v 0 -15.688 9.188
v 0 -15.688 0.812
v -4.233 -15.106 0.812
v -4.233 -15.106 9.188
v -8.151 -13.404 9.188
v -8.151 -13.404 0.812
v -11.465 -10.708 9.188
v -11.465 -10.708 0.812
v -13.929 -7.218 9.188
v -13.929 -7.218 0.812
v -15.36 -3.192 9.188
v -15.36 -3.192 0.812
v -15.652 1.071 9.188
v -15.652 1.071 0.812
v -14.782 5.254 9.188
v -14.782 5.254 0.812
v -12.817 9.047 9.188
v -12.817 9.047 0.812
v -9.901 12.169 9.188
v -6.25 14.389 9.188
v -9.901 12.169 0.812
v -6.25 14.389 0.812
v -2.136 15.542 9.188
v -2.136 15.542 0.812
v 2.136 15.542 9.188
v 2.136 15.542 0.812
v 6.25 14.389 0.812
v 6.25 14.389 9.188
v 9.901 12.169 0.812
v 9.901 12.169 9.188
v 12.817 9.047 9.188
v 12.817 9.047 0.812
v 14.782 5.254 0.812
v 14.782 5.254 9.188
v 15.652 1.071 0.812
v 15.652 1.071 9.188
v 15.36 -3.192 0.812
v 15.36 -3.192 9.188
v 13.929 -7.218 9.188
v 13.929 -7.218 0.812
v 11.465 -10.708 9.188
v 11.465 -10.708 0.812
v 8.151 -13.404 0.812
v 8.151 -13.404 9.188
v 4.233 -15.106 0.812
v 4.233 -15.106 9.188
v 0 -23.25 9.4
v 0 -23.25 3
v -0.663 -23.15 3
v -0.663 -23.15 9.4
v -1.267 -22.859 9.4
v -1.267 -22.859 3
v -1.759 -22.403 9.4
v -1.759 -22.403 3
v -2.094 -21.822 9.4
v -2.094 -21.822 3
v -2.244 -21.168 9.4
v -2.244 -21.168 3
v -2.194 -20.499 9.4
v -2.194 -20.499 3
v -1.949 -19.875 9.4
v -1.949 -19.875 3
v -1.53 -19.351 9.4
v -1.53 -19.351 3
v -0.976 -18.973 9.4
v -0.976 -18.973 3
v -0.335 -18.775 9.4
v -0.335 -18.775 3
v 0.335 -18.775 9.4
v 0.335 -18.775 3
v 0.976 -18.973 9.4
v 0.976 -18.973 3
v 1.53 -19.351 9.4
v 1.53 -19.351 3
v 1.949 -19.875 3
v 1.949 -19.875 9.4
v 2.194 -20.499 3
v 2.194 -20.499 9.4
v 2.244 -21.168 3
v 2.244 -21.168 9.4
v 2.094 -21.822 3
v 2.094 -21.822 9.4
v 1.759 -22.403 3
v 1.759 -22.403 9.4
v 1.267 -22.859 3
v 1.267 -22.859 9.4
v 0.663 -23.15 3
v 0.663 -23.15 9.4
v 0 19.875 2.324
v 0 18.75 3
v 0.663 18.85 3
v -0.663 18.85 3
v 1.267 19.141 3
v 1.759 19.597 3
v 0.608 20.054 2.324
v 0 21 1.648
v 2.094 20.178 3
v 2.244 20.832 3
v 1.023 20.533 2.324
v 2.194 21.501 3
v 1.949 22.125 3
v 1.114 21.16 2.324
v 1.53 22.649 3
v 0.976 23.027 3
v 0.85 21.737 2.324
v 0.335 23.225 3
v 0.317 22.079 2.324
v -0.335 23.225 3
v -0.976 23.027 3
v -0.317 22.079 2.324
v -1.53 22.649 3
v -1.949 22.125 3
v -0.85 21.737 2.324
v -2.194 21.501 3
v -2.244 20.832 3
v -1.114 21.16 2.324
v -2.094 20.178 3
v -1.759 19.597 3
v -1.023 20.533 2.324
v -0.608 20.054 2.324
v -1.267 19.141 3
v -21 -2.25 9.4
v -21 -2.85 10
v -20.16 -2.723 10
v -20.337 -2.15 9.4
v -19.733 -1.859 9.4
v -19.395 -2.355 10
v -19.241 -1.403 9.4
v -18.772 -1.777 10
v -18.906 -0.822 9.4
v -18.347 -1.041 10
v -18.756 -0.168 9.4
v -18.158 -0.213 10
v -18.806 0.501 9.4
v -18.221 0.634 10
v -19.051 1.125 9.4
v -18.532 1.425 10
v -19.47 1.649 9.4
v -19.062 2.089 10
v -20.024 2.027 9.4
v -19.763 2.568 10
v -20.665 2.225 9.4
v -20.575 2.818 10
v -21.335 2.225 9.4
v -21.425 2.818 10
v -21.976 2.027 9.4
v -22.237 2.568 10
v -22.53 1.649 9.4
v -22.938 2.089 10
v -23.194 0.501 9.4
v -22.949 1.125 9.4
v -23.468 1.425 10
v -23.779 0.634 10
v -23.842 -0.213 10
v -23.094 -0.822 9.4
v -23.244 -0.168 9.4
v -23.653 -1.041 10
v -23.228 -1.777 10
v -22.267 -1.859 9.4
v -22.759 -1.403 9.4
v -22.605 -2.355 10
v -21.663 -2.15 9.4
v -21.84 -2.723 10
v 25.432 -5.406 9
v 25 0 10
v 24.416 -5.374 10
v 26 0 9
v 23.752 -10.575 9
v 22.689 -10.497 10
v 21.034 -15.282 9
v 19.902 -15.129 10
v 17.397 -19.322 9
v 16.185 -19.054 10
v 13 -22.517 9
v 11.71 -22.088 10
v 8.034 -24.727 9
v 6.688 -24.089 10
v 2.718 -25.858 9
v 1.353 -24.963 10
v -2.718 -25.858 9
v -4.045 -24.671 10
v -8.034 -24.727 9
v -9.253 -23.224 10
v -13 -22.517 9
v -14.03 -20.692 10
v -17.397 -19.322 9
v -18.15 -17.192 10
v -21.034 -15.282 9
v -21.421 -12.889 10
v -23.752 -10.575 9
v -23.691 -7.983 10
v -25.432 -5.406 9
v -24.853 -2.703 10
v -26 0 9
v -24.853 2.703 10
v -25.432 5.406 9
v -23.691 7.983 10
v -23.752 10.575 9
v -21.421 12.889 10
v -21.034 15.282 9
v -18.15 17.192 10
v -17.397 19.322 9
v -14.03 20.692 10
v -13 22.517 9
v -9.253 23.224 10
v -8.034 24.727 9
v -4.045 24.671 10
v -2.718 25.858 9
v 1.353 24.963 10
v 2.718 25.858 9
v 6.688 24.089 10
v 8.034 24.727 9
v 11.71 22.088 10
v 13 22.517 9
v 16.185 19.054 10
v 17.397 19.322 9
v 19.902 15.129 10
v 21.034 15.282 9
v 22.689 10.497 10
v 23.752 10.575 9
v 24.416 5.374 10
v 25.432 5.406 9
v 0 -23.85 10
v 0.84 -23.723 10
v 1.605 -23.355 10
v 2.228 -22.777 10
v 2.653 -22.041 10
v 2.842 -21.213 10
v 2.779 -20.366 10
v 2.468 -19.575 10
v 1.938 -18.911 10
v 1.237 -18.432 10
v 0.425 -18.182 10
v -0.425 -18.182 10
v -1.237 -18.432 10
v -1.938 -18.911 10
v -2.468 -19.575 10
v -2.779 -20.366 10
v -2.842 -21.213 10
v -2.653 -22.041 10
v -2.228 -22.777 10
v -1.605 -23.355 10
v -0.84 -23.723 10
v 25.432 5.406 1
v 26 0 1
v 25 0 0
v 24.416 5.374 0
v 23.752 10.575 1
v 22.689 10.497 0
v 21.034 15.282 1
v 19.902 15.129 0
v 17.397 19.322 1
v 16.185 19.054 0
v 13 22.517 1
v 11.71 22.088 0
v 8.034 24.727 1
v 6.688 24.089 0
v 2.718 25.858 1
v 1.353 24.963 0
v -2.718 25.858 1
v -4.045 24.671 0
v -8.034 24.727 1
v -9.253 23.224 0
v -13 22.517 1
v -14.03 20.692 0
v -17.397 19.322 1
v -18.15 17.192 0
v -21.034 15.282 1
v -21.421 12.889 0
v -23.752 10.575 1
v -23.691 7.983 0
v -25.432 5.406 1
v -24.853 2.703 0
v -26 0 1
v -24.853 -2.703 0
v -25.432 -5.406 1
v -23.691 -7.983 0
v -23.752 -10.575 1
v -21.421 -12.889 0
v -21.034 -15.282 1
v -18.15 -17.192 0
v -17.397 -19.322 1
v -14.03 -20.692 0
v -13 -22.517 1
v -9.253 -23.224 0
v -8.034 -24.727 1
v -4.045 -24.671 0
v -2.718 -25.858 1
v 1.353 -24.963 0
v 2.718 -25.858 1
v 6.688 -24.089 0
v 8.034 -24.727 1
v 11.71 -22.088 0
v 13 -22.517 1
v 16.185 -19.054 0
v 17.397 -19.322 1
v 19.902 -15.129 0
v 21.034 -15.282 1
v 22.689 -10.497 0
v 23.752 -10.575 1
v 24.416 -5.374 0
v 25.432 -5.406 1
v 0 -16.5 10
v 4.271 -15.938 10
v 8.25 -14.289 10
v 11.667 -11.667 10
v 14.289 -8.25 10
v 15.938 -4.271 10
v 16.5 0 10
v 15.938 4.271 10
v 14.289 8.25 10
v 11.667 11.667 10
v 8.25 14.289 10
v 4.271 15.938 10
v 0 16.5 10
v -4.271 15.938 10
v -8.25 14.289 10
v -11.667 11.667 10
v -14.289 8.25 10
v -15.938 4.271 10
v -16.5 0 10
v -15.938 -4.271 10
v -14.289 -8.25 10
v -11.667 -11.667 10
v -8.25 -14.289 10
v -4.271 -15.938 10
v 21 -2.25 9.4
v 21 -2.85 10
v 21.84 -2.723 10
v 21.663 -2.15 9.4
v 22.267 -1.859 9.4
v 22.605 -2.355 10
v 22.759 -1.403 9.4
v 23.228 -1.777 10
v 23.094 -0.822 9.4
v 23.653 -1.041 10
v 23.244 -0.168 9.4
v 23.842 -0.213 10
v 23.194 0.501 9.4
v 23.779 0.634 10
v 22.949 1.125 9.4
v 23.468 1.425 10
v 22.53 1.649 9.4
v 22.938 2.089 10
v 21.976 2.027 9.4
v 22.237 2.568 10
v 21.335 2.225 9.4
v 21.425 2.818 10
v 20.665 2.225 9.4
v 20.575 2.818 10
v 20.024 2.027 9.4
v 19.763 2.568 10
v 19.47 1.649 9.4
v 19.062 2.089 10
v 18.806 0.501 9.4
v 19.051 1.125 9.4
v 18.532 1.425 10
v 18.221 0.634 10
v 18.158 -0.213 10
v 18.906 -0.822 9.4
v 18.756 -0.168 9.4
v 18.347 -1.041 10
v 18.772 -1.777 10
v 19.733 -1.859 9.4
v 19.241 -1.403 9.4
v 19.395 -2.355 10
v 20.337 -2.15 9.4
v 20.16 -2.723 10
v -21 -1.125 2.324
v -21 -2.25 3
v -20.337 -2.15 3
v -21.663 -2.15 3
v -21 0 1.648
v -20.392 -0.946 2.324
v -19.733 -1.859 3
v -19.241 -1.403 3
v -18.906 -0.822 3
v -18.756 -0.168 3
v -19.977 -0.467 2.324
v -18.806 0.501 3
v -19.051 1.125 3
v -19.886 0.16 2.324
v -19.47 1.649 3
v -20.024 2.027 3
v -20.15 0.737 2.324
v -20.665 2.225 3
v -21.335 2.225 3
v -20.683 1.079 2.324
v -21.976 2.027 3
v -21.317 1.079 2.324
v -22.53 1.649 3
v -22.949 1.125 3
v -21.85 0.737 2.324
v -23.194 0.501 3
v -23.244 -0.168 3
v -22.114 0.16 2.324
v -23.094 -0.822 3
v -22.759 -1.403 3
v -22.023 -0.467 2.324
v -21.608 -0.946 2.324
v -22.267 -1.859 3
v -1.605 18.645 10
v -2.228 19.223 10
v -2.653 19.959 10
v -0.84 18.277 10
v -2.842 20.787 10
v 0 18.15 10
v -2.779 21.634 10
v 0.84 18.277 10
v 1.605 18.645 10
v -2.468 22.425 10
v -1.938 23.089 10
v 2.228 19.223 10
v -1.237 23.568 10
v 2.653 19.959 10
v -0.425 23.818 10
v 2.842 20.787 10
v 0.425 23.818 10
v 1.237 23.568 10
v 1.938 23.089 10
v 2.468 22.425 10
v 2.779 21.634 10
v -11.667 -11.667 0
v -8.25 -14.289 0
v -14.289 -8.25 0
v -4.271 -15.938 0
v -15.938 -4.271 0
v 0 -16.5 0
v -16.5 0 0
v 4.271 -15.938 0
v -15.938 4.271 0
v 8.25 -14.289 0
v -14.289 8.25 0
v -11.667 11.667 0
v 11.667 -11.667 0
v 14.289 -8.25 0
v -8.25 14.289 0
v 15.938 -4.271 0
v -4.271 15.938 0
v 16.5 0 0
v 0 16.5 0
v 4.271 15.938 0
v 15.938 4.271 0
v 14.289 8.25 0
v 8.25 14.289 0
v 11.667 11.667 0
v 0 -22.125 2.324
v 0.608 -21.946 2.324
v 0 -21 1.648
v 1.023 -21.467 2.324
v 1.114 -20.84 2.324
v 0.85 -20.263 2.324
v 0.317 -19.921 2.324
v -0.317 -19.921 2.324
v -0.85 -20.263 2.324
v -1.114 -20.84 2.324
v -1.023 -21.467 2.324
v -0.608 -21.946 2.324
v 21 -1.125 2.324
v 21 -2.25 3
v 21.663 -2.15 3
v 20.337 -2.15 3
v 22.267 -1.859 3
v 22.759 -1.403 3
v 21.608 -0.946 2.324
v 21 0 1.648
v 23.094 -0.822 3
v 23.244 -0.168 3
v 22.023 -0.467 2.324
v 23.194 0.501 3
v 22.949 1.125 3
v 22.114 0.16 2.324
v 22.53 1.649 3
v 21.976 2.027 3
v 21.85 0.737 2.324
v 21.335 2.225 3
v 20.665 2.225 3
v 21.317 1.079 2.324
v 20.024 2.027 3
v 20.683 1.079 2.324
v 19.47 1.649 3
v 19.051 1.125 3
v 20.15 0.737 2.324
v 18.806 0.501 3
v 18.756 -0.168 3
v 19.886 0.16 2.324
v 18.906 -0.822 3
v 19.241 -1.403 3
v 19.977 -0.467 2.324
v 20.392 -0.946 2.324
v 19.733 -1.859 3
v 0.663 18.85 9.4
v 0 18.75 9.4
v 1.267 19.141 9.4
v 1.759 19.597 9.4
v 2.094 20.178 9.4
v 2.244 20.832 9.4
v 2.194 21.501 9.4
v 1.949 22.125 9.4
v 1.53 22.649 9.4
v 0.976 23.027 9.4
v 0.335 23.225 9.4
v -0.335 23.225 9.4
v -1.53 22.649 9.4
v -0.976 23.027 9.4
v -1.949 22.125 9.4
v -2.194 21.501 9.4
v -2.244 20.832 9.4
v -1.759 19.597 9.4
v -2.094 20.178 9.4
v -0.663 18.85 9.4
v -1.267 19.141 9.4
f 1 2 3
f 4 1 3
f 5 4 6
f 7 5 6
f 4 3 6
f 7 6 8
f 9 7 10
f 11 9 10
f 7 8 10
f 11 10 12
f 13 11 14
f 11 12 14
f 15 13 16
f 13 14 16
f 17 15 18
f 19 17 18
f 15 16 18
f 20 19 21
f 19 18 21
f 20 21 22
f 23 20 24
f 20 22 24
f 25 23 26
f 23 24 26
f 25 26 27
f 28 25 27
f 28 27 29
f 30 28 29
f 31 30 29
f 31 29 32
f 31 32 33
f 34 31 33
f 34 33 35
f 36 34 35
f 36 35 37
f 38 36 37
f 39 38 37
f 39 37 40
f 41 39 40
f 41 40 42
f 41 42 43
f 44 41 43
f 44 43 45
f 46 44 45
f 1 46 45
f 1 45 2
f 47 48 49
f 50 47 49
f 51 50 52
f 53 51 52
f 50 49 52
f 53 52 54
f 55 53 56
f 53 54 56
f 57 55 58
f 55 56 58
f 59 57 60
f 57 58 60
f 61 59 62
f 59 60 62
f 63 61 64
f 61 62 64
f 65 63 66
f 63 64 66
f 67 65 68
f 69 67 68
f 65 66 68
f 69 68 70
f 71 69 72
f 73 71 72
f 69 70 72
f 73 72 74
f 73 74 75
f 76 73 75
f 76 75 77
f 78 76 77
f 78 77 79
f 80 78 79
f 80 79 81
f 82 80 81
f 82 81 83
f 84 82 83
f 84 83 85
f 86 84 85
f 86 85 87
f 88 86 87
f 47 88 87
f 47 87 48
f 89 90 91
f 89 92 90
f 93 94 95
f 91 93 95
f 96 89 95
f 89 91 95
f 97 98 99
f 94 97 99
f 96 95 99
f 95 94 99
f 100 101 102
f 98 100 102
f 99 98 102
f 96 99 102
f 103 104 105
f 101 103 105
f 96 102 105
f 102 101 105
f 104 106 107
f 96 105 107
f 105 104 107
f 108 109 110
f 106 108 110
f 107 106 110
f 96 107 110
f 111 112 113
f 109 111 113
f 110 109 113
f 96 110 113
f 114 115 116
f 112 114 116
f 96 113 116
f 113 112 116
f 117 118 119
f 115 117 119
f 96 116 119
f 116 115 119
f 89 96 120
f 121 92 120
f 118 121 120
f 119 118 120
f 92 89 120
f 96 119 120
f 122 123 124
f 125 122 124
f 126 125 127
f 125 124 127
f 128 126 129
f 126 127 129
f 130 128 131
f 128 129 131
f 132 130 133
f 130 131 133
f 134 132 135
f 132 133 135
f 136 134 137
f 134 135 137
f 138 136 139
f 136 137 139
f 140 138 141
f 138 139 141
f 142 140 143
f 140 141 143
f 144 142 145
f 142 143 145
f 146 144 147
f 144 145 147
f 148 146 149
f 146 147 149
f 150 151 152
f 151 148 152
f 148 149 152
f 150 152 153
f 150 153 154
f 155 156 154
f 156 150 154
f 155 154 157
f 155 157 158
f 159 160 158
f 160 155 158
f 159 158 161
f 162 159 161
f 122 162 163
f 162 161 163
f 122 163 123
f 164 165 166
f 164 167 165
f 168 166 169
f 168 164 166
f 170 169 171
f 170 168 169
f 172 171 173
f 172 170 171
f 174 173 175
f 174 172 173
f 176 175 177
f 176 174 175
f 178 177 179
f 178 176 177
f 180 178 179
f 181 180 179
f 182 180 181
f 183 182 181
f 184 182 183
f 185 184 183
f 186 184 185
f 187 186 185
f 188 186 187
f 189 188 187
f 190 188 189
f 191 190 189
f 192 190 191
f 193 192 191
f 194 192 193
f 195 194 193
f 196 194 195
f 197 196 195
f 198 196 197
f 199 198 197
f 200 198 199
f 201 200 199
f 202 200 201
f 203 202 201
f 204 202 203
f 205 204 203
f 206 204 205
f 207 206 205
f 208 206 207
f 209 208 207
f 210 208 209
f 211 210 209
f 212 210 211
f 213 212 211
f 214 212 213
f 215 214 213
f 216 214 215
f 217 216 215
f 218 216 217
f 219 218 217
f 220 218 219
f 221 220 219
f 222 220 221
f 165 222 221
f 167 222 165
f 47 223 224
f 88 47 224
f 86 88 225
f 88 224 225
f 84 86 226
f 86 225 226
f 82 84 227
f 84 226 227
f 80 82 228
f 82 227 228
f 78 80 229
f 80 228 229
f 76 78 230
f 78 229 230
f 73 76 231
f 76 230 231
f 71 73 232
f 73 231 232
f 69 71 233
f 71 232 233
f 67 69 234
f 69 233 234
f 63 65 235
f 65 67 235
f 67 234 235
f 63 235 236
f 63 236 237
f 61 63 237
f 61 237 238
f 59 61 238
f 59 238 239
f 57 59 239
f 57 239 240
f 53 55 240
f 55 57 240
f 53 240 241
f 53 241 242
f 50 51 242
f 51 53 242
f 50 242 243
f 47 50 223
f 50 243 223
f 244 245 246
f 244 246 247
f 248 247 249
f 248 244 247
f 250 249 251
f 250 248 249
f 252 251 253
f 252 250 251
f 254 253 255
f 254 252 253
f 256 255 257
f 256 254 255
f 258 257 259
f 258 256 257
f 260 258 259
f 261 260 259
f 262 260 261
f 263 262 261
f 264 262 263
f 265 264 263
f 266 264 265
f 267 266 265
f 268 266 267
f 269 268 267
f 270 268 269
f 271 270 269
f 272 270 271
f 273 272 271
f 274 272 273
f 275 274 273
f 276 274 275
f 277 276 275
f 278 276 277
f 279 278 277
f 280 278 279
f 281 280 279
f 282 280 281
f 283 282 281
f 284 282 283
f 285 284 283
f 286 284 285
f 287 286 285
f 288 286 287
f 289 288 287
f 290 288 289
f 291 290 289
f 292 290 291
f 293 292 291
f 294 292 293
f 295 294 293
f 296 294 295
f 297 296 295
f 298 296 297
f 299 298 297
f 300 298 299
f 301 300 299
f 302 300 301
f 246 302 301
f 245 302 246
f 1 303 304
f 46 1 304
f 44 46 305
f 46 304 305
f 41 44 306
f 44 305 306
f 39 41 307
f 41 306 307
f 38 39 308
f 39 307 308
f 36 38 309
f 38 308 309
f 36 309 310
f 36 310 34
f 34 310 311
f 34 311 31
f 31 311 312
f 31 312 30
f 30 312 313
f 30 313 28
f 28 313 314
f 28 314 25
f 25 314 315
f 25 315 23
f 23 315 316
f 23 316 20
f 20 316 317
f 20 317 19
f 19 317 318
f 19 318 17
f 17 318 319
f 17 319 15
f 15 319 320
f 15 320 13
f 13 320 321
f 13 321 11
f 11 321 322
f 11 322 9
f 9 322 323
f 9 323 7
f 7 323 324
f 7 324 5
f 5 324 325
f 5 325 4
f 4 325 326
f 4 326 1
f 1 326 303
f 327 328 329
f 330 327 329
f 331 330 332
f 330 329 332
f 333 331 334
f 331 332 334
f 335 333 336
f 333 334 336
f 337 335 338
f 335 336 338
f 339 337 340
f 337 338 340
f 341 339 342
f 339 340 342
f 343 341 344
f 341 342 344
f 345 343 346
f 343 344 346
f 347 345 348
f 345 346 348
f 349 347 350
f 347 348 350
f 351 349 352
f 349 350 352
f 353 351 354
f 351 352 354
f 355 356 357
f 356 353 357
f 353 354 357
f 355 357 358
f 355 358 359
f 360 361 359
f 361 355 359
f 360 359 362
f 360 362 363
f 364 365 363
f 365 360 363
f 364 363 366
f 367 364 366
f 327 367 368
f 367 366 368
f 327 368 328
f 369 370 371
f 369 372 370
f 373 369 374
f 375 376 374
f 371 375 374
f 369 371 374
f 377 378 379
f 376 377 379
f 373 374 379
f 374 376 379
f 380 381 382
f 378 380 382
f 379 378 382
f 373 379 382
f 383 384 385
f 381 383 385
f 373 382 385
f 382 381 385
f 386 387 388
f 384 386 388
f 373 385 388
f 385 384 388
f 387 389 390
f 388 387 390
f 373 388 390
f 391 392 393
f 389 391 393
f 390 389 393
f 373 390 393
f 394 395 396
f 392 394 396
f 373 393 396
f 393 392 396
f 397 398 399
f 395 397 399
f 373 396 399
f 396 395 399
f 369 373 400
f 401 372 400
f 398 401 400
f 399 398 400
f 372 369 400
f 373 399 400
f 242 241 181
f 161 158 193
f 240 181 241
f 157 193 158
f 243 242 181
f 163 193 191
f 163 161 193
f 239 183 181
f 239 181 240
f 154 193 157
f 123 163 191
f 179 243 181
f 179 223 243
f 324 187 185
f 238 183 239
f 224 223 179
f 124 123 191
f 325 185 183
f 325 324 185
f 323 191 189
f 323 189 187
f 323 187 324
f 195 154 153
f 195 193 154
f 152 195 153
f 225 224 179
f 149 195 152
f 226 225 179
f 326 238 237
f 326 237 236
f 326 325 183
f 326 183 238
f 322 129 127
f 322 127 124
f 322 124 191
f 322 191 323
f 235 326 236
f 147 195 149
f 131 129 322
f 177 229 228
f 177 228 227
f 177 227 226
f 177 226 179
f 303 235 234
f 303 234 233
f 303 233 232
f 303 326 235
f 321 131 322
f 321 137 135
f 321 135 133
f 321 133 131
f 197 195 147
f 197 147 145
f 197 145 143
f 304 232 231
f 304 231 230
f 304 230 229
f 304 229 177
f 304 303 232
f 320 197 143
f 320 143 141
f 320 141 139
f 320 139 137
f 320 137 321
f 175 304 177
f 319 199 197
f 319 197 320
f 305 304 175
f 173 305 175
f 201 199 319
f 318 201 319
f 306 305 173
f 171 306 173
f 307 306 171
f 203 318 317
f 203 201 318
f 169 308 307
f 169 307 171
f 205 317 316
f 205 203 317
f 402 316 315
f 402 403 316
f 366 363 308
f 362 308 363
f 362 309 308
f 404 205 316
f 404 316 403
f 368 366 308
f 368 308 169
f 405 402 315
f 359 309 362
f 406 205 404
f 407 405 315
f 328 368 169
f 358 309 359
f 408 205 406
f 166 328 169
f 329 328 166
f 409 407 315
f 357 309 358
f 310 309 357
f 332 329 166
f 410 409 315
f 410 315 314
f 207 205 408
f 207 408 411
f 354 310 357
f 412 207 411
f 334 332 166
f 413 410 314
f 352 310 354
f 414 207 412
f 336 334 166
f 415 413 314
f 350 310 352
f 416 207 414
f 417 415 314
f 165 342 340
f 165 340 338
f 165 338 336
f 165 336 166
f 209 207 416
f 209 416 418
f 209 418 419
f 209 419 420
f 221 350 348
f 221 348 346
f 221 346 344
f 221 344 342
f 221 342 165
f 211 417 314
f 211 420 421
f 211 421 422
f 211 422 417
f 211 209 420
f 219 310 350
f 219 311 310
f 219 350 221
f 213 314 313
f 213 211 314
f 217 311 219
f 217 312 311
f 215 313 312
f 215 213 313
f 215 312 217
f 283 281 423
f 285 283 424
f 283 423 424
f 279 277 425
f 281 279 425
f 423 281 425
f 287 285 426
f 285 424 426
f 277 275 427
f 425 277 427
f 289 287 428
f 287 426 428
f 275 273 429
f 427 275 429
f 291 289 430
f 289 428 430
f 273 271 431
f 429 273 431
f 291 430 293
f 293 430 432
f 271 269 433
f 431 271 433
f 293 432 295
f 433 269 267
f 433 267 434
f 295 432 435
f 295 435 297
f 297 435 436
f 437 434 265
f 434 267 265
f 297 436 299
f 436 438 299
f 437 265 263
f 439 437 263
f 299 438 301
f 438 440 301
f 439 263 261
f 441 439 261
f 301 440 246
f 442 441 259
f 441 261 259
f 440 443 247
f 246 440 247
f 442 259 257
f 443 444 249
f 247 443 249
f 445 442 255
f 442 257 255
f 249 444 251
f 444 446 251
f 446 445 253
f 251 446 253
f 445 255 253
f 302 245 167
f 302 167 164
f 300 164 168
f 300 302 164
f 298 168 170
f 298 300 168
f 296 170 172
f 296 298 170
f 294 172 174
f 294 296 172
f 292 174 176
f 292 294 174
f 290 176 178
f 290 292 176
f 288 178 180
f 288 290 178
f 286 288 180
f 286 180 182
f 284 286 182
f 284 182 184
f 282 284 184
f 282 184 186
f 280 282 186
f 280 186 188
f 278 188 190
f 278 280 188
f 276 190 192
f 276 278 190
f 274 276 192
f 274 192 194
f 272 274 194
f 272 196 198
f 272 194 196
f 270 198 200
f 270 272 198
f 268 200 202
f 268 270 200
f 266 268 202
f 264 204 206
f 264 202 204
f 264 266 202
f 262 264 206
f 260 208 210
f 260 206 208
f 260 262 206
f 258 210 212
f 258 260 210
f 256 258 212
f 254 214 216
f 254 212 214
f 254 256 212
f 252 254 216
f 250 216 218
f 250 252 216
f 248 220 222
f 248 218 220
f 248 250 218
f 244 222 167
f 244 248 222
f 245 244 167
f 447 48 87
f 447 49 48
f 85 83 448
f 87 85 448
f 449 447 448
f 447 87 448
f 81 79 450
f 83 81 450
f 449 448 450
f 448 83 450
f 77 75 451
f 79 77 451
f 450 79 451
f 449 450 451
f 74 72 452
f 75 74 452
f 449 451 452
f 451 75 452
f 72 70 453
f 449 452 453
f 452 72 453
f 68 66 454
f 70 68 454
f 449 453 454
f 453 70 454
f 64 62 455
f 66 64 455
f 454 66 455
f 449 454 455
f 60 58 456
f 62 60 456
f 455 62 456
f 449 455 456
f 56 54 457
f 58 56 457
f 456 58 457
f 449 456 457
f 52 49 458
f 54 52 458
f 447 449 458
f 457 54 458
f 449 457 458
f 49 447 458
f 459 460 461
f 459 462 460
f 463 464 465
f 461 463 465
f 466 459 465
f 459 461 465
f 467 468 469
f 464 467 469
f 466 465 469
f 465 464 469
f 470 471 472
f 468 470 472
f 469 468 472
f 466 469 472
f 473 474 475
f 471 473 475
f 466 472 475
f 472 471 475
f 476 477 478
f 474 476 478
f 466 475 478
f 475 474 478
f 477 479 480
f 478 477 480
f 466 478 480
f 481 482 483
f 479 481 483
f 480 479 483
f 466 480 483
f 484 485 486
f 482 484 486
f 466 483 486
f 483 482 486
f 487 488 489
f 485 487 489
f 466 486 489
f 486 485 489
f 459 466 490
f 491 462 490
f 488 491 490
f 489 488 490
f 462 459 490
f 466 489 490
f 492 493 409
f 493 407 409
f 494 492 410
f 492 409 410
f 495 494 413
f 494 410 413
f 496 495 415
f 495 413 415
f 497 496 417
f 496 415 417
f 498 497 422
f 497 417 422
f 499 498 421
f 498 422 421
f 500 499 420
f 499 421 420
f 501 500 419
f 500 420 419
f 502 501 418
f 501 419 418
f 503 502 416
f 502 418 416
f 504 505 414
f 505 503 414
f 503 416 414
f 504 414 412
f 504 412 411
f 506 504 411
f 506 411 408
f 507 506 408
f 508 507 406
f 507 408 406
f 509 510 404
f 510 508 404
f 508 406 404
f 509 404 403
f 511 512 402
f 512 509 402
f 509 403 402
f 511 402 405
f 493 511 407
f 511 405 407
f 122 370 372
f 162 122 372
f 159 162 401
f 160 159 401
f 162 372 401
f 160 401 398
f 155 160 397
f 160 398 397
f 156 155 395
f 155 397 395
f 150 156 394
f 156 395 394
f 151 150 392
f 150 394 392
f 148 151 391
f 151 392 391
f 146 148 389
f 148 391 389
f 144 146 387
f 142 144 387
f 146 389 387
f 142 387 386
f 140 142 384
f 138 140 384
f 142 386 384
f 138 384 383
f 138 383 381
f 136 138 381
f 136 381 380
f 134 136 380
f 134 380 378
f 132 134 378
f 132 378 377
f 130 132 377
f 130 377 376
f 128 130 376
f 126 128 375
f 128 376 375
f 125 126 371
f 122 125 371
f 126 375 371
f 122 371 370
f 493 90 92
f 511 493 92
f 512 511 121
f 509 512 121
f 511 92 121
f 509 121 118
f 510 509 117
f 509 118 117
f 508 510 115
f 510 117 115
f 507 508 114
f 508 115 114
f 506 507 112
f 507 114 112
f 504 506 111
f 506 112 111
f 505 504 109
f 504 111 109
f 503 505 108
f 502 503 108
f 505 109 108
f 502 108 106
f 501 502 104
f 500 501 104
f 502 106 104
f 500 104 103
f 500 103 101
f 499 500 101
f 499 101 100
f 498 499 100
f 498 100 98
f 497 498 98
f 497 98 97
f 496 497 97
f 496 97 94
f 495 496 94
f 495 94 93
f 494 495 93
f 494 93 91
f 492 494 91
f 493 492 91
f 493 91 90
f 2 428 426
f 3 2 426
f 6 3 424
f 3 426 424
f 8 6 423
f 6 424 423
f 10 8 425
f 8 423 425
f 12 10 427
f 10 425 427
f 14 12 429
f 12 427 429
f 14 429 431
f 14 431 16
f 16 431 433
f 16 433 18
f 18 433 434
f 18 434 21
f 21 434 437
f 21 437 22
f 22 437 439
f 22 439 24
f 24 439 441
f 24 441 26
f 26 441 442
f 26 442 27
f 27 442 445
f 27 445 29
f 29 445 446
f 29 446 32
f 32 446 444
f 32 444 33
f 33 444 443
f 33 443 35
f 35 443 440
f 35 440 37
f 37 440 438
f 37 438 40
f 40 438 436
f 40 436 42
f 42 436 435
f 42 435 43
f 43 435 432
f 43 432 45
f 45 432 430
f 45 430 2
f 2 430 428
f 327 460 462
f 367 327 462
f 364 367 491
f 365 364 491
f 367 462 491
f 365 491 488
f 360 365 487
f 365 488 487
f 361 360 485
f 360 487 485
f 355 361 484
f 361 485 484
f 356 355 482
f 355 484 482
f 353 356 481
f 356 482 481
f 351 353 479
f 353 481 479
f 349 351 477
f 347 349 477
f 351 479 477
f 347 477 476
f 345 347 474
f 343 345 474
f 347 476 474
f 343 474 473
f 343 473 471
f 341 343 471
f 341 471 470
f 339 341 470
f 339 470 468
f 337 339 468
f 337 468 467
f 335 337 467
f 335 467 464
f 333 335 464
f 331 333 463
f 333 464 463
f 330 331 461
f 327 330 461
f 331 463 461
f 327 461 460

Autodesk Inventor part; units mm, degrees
ref_plane "YZ Plane" through (0, 0, 0) normal (1, 0, 0) x (0, 1, 0)
ref_plane "XZ Plane" through (0, 0, 0) normal (0, 1, 0) x (-1, 0, 0)
ref_plane "XY Plane" through (0, 0, 0) normal (0, 0, 1) x (1, 0, 0)
sketch "Sketch1" plane through (0, 0, 0) normal (0, 0, 1) x (1, 0, 0)
  line L0 (-36.4, 0) -> (36.4, 0) construction
  line L1 (0, -36.4) -> (0, 36.4) construction
  circle A0 centre (0, 0) radius 26
  dimension "d0" = 52
extrude "Выдавливание1" add sketch "Sketch1" along normal blind 10
hole "Отверстие1" at (0, 0, 10) direction (0, 0, -1) diameter 31.3762 end through all thread size "M33x1.5" class "6H" standard "ISO Metric profile"
sketch "Sketch2" plane through (0, 0, 10) normal (0, 0, 1) x (1, 0, 0)
  circle A0 centre (0, 0) radius 26 projected
  circle A1 centre (0, 0) radius 21 construction
  line L0 (-36.4, 0) -> (36.4, 0) construction
  line L1 (0, -36.4) -> (0, 36.4) construction
  point P0 (-21, 0)
  point P1 (0, 21)
  point P2 (21, 0)
  point P3 (0, -21)
  dimension "d13" = 42
hole "Отверстие2" at (-21, 0, 10) at (0, 21, 10) at (21, 0, 10) at (0, -21, 10) direction (0, 0, -1) diameter 4.5 depth 7 tip angle 118
chamfer "Фаска1" distance 0.6 angle 45 4 edges at (0, -18.75, 10) (-21, 2.25, 10) (21, 2.25, 10) (0, 23.25, 10)
chamfer "Фаска2" distance 1 angle 45 2 edges at (-26, 0, 10) (-26, 0, 0)
sketch "Sketch3" plane through (0, 0, 0) normal (1, 0, 0) x (0, 1, 0)
  line L0 (-15.6881, 0) -> (-15.6881, 10) construction
  line L1 (15.6881, 0) -> (15.6881, 10) construction
  line L2 (-16.5, 10) -> (0, -6.5)
  line L3 (-16.5, 10) -> (0, 10)
  line L4 (0, 10) -> (0, -6.5)
  line L5 (0, -11.1) -> (0, 21.1) construction
  line L6 (-15.6074, 5) -> (15.0846, 5) construction
  line L7 (-22.9376, 0) -> (22.1257, 0) construction
  line L8 (-16.5, 0) -> (0, 16.5)
  line L9 (-16.5, 0) -> (0, 0)
  line L10 (0, 0) -> (0, 16.5)
  point P0 (15.6881, 5)
  dimension "d30" = 10
  dimension "d31" = 33
  dimension "d32" = 45
  dimension "d34" = 5
revolve "Вращение1" cut sketch "Sketch3" angle 360 about axis through (0, 0, -10) along (0, 0, 1)
equation "\"d0\" = D_L"
equation "\"d2\" = m_"
equation "\"d13\" = D_x"
equation "\"d14\" = d1"
equation "\"d16\" = d1"
equation "\"d19\" = h_"
equation "\"d21\" = c1"
equation "\"d24\" = c_"
equation "\"d30\" = m_"
equation "\"d31\" = d_"
equation "\"d34\" = 0.5 * m_"
equation "\"d_\" = 33"
equation "\"D_L\" = 52"
equation "\"D_x\" = 42"
equation "\"d1\" = 4.5"
equation "\"m_\" = 10"
equation "\"h_\" = 7"
equation "\"c_\" = 1"
equation "\"c1\" = 0.6"
properties part number "Гайка M33x1.5 6H ГОСТ 6393-73" material "Сталь, мягкая"
